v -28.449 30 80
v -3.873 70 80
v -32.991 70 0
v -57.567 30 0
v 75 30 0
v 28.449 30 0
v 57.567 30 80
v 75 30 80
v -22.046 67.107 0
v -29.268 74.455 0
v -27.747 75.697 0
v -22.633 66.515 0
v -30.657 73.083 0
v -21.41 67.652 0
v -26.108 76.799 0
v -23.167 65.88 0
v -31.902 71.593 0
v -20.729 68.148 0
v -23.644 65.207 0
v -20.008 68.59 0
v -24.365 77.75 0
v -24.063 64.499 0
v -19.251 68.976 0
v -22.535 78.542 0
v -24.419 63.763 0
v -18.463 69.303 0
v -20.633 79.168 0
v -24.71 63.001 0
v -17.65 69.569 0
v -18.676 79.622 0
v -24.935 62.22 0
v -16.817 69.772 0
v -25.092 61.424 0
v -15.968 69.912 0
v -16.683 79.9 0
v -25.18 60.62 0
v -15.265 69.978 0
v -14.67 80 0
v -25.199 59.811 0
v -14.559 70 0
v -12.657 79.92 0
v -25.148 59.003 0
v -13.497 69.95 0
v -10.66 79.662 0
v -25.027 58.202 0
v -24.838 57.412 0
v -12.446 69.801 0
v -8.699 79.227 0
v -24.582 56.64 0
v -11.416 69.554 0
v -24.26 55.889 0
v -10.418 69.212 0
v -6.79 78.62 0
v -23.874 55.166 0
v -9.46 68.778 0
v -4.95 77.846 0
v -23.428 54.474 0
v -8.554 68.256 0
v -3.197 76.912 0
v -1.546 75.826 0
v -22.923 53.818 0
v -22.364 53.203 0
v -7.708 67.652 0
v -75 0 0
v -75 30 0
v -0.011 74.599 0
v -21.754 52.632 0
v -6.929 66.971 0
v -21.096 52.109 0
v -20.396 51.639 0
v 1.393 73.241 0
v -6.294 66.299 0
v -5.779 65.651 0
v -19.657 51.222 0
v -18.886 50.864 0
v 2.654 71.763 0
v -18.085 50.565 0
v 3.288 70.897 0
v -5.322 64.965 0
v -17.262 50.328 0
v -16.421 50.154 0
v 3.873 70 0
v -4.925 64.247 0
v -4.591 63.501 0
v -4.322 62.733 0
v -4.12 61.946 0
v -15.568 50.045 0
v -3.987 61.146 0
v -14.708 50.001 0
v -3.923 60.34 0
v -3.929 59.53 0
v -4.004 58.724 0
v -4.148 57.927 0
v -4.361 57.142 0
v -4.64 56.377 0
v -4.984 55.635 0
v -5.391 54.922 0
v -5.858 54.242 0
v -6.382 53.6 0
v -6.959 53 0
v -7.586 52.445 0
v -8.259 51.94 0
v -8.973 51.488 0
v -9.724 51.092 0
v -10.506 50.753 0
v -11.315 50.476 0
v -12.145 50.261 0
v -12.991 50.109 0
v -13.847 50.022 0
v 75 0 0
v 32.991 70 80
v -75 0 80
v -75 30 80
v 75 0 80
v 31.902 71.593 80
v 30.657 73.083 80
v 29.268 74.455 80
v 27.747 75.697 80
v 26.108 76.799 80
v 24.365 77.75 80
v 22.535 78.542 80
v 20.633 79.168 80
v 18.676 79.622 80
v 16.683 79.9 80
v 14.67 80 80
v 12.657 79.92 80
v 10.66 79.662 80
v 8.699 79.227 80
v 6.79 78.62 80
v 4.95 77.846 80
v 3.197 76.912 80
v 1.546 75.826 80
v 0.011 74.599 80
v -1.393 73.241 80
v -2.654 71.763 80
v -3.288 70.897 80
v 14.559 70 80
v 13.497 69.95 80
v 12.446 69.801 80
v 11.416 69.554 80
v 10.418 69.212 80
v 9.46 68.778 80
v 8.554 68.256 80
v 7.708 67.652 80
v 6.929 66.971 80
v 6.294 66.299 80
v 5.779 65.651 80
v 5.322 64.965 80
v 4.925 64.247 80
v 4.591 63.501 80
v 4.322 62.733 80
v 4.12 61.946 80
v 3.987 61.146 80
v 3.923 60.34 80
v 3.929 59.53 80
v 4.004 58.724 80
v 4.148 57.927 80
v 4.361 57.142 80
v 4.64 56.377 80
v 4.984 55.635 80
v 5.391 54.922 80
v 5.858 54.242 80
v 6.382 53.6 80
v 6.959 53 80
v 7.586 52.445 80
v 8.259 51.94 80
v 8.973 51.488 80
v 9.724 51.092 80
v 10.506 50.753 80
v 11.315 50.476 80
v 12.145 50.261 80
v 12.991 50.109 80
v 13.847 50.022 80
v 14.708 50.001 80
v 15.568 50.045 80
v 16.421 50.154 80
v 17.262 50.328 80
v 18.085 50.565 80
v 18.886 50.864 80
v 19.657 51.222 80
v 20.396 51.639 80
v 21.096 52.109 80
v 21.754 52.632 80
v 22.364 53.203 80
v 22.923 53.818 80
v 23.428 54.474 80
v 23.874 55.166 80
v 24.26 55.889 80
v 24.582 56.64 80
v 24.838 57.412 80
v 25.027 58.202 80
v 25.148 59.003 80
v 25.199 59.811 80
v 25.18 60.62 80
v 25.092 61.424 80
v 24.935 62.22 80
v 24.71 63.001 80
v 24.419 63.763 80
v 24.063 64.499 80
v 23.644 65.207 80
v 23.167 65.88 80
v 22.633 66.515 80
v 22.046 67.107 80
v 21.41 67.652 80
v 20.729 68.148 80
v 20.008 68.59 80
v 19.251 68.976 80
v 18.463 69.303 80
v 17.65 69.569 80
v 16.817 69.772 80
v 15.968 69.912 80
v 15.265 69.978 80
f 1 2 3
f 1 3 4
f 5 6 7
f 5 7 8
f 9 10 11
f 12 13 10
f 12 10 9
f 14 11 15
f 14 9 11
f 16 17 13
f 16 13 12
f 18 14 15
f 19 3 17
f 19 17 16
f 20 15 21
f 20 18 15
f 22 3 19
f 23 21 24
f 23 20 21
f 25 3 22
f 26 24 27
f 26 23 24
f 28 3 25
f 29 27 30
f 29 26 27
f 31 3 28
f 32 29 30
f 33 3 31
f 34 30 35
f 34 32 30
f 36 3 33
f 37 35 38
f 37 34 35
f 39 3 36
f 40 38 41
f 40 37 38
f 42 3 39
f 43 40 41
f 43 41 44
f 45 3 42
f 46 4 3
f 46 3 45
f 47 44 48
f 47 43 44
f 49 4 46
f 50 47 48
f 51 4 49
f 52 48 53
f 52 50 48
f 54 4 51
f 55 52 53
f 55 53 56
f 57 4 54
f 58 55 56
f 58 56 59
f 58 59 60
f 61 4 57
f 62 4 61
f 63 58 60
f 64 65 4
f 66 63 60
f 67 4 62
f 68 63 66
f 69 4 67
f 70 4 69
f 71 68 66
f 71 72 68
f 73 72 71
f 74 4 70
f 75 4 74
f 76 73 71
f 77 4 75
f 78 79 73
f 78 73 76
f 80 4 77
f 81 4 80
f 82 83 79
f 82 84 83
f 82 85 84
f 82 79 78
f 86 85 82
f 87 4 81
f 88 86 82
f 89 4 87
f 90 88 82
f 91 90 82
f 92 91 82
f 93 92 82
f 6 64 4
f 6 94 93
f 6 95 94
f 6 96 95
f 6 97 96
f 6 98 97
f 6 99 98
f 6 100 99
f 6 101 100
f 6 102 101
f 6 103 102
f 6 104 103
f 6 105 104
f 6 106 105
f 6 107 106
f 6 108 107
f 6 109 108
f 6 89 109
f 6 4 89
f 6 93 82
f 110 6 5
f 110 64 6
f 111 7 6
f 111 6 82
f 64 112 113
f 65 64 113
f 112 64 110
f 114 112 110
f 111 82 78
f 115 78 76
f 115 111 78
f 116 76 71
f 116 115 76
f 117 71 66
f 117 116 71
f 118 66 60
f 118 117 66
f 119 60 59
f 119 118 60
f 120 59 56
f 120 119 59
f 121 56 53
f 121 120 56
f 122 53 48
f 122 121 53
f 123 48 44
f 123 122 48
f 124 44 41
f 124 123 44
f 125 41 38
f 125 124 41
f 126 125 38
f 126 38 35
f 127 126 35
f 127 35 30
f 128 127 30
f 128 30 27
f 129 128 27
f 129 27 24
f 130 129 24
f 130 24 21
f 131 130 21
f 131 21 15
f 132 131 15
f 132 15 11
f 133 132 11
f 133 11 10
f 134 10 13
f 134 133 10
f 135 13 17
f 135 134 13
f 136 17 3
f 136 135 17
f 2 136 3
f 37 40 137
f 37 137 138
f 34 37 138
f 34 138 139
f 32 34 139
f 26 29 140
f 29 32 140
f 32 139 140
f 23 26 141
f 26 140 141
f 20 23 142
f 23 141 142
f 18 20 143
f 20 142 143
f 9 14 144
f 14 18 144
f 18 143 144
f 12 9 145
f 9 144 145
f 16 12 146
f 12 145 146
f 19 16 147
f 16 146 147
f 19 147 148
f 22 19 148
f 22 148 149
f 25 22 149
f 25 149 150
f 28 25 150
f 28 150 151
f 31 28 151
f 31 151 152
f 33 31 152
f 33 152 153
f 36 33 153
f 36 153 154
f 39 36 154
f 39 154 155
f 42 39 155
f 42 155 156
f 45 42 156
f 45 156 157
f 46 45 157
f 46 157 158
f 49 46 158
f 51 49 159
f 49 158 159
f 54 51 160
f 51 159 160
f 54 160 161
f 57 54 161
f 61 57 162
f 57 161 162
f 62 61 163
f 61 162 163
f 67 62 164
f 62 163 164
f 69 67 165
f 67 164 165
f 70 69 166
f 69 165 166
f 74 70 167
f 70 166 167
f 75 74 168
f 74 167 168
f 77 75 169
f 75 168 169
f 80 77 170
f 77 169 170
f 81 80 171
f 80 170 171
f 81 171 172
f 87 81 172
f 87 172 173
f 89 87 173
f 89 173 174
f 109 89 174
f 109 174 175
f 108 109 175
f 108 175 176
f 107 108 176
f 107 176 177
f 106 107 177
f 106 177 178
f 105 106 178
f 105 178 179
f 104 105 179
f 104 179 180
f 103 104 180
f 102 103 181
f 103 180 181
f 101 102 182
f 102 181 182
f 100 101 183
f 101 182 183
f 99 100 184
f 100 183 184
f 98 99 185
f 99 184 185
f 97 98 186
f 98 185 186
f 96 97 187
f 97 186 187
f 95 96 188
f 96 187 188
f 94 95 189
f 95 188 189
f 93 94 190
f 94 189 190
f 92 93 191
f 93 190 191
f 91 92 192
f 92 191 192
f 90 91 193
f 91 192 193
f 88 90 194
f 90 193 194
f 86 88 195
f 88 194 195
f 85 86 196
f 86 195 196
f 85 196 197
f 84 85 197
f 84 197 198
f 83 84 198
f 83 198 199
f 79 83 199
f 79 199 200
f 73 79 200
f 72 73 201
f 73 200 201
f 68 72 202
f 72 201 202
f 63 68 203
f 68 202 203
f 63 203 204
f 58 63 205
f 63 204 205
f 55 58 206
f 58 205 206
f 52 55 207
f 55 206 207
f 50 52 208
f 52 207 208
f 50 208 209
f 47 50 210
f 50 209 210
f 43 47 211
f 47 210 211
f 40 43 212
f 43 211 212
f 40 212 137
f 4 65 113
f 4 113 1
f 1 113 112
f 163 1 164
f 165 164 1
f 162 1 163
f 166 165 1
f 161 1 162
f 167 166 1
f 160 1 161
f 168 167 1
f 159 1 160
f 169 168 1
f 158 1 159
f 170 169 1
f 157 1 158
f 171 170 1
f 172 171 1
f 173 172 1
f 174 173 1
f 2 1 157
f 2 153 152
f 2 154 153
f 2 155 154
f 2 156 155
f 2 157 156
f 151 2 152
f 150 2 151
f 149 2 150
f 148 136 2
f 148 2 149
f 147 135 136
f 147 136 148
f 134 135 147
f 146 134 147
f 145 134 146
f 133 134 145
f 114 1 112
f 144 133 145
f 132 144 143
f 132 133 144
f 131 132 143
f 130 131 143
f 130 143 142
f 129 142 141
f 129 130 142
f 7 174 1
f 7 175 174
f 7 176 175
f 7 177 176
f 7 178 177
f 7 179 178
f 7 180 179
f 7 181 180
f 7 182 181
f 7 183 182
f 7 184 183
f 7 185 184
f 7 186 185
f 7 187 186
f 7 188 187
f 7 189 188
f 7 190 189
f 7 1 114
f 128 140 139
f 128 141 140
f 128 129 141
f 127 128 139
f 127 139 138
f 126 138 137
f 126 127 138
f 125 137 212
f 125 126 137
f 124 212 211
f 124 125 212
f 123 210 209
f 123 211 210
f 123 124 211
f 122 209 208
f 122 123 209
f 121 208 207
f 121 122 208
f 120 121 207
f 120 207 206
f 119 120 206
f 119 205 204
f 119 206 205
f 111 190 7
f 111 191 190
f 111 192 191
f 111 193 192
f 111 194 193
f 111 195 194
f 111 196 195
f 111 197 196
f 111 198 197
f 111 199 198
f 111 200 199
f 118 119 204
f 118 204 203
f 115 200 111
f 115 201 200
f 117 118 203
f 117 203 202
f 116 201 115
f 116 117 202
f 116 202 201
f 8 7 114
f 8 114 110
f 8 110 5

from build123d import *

# Parameters (mm, degrees)
SKETCH1_W                       = 150
SKETCH1_H                       = 30
BOSS_EXTRUDE1_DEPTH             = 80
BOSS_EXTRUDE4_REACH             = 65.239
SKETCH3_R                       = 10
BOSS_EXTRUDE4_DIRECTION_2_REACH = 65.239


with BuildPart() as part:
    # Sketch1 → Boss-Extrude1 (new body)
    with BuildSketch(Plane.XY):
        with Locations((0, 15)):
            Rectangle(SKETCH1_W, SKETCH1_H)
    extrude(amount=BOSS_EXTRUDE1_DEPTH)

    # Boss-Extrude4: up to this face of the body (flat: up to its plane)
    boss_extrude4_end = Plane(part.part.faces().sort_by_distance((0, 15, 80))[0])
    # Sketch3 → Boss-Extrude4 (add, up to the picked face)
    with BuildSketch(Plane(origin=(12.855752194, 0, 35.320888862), x_dir=(0, 1, 0), z_dir=(0.342020143, 0, 0.939692621)), mode=Mode.PRIVATE) as boss_extrude4_sk1:
        with BuildLine():
            Line((30, -26.73371311), (70, -3.639702343))
            ThreePointArc((70, -3.639702343), (80, 13.680805733), (70, 31.001313809))
            Line((70, 31.001313809), (30, 54.095324576))
            Line((30, 54.095324576), (30, -26.73371311))
        make_face()
        with Locations((60, 13.680805733)):
            Circle(SKETCH3_R, mode=Mode.SUBTRACT)
    boss_extrude4_tool1 = split(extrude(boss_extrude4_sk1.sketch, amount=BOSS_EXTRUDE4_REACH, mode=Mode.PRIVATE), bisect_by=boss_extrude4_end, keep=Keep.BOTH, mode=Mode.PRIVATE)
    add(boss_extrude4_tool1.solids().sort_by_distance((0, 48.492065, 40))[0])

    # Boss-Extrude4 direction 2: up to this face of the body (flat: up to its plane)
    boss_extrude4_direction_2_end = Plane(part.part.faces().sort_by_distance((0, 15, 0))[0])
    # Sketch3 → Boss-Extrude4 direction 2 (add, up to the picked face)
    with BuildSketch(Plane(origin=(12.855752194, 0, 35.320888862), x_dir=(0, 1, 0), z_dir=(0.342020143, 0, 0.939692621)), mode=Mode.PRIVATE) as boss_extrude4_direction_2_sk1:
        with BuildLine():
            Line((30, -26.73371311), (70, -3.639702343))
            ThreePointArc((70, -3.639702343), (80, 13.680805733), (70, 31.001313809))
            Line((70, 31.001313809), (30, 54.095324576))
            Line((30, 54.095324576), (30, -26.73371311))
        make_face()
        with Locations((60, 13.680805733)):
            Circle(SKETCH3_R, mode=Mode.SUBTRACT)
    boss_extrude4_direction_2_tool1 = split(extrude(boss_extrude4_direction_2_sk1.sketch, amount=-BOSS_EXTRUDE4_DIRECTION_2_REACH, mode=Mode.PRIVATE), bisect_by=boss_extrude4_direction_2_end, keep=Keep.BOTH, mode=Mode.PRIVATE)
    add(boss_extrude4_direction_2_tool1.solids().sort_by_distance((0, 48.492065, 40))[0])


solid = part.part
